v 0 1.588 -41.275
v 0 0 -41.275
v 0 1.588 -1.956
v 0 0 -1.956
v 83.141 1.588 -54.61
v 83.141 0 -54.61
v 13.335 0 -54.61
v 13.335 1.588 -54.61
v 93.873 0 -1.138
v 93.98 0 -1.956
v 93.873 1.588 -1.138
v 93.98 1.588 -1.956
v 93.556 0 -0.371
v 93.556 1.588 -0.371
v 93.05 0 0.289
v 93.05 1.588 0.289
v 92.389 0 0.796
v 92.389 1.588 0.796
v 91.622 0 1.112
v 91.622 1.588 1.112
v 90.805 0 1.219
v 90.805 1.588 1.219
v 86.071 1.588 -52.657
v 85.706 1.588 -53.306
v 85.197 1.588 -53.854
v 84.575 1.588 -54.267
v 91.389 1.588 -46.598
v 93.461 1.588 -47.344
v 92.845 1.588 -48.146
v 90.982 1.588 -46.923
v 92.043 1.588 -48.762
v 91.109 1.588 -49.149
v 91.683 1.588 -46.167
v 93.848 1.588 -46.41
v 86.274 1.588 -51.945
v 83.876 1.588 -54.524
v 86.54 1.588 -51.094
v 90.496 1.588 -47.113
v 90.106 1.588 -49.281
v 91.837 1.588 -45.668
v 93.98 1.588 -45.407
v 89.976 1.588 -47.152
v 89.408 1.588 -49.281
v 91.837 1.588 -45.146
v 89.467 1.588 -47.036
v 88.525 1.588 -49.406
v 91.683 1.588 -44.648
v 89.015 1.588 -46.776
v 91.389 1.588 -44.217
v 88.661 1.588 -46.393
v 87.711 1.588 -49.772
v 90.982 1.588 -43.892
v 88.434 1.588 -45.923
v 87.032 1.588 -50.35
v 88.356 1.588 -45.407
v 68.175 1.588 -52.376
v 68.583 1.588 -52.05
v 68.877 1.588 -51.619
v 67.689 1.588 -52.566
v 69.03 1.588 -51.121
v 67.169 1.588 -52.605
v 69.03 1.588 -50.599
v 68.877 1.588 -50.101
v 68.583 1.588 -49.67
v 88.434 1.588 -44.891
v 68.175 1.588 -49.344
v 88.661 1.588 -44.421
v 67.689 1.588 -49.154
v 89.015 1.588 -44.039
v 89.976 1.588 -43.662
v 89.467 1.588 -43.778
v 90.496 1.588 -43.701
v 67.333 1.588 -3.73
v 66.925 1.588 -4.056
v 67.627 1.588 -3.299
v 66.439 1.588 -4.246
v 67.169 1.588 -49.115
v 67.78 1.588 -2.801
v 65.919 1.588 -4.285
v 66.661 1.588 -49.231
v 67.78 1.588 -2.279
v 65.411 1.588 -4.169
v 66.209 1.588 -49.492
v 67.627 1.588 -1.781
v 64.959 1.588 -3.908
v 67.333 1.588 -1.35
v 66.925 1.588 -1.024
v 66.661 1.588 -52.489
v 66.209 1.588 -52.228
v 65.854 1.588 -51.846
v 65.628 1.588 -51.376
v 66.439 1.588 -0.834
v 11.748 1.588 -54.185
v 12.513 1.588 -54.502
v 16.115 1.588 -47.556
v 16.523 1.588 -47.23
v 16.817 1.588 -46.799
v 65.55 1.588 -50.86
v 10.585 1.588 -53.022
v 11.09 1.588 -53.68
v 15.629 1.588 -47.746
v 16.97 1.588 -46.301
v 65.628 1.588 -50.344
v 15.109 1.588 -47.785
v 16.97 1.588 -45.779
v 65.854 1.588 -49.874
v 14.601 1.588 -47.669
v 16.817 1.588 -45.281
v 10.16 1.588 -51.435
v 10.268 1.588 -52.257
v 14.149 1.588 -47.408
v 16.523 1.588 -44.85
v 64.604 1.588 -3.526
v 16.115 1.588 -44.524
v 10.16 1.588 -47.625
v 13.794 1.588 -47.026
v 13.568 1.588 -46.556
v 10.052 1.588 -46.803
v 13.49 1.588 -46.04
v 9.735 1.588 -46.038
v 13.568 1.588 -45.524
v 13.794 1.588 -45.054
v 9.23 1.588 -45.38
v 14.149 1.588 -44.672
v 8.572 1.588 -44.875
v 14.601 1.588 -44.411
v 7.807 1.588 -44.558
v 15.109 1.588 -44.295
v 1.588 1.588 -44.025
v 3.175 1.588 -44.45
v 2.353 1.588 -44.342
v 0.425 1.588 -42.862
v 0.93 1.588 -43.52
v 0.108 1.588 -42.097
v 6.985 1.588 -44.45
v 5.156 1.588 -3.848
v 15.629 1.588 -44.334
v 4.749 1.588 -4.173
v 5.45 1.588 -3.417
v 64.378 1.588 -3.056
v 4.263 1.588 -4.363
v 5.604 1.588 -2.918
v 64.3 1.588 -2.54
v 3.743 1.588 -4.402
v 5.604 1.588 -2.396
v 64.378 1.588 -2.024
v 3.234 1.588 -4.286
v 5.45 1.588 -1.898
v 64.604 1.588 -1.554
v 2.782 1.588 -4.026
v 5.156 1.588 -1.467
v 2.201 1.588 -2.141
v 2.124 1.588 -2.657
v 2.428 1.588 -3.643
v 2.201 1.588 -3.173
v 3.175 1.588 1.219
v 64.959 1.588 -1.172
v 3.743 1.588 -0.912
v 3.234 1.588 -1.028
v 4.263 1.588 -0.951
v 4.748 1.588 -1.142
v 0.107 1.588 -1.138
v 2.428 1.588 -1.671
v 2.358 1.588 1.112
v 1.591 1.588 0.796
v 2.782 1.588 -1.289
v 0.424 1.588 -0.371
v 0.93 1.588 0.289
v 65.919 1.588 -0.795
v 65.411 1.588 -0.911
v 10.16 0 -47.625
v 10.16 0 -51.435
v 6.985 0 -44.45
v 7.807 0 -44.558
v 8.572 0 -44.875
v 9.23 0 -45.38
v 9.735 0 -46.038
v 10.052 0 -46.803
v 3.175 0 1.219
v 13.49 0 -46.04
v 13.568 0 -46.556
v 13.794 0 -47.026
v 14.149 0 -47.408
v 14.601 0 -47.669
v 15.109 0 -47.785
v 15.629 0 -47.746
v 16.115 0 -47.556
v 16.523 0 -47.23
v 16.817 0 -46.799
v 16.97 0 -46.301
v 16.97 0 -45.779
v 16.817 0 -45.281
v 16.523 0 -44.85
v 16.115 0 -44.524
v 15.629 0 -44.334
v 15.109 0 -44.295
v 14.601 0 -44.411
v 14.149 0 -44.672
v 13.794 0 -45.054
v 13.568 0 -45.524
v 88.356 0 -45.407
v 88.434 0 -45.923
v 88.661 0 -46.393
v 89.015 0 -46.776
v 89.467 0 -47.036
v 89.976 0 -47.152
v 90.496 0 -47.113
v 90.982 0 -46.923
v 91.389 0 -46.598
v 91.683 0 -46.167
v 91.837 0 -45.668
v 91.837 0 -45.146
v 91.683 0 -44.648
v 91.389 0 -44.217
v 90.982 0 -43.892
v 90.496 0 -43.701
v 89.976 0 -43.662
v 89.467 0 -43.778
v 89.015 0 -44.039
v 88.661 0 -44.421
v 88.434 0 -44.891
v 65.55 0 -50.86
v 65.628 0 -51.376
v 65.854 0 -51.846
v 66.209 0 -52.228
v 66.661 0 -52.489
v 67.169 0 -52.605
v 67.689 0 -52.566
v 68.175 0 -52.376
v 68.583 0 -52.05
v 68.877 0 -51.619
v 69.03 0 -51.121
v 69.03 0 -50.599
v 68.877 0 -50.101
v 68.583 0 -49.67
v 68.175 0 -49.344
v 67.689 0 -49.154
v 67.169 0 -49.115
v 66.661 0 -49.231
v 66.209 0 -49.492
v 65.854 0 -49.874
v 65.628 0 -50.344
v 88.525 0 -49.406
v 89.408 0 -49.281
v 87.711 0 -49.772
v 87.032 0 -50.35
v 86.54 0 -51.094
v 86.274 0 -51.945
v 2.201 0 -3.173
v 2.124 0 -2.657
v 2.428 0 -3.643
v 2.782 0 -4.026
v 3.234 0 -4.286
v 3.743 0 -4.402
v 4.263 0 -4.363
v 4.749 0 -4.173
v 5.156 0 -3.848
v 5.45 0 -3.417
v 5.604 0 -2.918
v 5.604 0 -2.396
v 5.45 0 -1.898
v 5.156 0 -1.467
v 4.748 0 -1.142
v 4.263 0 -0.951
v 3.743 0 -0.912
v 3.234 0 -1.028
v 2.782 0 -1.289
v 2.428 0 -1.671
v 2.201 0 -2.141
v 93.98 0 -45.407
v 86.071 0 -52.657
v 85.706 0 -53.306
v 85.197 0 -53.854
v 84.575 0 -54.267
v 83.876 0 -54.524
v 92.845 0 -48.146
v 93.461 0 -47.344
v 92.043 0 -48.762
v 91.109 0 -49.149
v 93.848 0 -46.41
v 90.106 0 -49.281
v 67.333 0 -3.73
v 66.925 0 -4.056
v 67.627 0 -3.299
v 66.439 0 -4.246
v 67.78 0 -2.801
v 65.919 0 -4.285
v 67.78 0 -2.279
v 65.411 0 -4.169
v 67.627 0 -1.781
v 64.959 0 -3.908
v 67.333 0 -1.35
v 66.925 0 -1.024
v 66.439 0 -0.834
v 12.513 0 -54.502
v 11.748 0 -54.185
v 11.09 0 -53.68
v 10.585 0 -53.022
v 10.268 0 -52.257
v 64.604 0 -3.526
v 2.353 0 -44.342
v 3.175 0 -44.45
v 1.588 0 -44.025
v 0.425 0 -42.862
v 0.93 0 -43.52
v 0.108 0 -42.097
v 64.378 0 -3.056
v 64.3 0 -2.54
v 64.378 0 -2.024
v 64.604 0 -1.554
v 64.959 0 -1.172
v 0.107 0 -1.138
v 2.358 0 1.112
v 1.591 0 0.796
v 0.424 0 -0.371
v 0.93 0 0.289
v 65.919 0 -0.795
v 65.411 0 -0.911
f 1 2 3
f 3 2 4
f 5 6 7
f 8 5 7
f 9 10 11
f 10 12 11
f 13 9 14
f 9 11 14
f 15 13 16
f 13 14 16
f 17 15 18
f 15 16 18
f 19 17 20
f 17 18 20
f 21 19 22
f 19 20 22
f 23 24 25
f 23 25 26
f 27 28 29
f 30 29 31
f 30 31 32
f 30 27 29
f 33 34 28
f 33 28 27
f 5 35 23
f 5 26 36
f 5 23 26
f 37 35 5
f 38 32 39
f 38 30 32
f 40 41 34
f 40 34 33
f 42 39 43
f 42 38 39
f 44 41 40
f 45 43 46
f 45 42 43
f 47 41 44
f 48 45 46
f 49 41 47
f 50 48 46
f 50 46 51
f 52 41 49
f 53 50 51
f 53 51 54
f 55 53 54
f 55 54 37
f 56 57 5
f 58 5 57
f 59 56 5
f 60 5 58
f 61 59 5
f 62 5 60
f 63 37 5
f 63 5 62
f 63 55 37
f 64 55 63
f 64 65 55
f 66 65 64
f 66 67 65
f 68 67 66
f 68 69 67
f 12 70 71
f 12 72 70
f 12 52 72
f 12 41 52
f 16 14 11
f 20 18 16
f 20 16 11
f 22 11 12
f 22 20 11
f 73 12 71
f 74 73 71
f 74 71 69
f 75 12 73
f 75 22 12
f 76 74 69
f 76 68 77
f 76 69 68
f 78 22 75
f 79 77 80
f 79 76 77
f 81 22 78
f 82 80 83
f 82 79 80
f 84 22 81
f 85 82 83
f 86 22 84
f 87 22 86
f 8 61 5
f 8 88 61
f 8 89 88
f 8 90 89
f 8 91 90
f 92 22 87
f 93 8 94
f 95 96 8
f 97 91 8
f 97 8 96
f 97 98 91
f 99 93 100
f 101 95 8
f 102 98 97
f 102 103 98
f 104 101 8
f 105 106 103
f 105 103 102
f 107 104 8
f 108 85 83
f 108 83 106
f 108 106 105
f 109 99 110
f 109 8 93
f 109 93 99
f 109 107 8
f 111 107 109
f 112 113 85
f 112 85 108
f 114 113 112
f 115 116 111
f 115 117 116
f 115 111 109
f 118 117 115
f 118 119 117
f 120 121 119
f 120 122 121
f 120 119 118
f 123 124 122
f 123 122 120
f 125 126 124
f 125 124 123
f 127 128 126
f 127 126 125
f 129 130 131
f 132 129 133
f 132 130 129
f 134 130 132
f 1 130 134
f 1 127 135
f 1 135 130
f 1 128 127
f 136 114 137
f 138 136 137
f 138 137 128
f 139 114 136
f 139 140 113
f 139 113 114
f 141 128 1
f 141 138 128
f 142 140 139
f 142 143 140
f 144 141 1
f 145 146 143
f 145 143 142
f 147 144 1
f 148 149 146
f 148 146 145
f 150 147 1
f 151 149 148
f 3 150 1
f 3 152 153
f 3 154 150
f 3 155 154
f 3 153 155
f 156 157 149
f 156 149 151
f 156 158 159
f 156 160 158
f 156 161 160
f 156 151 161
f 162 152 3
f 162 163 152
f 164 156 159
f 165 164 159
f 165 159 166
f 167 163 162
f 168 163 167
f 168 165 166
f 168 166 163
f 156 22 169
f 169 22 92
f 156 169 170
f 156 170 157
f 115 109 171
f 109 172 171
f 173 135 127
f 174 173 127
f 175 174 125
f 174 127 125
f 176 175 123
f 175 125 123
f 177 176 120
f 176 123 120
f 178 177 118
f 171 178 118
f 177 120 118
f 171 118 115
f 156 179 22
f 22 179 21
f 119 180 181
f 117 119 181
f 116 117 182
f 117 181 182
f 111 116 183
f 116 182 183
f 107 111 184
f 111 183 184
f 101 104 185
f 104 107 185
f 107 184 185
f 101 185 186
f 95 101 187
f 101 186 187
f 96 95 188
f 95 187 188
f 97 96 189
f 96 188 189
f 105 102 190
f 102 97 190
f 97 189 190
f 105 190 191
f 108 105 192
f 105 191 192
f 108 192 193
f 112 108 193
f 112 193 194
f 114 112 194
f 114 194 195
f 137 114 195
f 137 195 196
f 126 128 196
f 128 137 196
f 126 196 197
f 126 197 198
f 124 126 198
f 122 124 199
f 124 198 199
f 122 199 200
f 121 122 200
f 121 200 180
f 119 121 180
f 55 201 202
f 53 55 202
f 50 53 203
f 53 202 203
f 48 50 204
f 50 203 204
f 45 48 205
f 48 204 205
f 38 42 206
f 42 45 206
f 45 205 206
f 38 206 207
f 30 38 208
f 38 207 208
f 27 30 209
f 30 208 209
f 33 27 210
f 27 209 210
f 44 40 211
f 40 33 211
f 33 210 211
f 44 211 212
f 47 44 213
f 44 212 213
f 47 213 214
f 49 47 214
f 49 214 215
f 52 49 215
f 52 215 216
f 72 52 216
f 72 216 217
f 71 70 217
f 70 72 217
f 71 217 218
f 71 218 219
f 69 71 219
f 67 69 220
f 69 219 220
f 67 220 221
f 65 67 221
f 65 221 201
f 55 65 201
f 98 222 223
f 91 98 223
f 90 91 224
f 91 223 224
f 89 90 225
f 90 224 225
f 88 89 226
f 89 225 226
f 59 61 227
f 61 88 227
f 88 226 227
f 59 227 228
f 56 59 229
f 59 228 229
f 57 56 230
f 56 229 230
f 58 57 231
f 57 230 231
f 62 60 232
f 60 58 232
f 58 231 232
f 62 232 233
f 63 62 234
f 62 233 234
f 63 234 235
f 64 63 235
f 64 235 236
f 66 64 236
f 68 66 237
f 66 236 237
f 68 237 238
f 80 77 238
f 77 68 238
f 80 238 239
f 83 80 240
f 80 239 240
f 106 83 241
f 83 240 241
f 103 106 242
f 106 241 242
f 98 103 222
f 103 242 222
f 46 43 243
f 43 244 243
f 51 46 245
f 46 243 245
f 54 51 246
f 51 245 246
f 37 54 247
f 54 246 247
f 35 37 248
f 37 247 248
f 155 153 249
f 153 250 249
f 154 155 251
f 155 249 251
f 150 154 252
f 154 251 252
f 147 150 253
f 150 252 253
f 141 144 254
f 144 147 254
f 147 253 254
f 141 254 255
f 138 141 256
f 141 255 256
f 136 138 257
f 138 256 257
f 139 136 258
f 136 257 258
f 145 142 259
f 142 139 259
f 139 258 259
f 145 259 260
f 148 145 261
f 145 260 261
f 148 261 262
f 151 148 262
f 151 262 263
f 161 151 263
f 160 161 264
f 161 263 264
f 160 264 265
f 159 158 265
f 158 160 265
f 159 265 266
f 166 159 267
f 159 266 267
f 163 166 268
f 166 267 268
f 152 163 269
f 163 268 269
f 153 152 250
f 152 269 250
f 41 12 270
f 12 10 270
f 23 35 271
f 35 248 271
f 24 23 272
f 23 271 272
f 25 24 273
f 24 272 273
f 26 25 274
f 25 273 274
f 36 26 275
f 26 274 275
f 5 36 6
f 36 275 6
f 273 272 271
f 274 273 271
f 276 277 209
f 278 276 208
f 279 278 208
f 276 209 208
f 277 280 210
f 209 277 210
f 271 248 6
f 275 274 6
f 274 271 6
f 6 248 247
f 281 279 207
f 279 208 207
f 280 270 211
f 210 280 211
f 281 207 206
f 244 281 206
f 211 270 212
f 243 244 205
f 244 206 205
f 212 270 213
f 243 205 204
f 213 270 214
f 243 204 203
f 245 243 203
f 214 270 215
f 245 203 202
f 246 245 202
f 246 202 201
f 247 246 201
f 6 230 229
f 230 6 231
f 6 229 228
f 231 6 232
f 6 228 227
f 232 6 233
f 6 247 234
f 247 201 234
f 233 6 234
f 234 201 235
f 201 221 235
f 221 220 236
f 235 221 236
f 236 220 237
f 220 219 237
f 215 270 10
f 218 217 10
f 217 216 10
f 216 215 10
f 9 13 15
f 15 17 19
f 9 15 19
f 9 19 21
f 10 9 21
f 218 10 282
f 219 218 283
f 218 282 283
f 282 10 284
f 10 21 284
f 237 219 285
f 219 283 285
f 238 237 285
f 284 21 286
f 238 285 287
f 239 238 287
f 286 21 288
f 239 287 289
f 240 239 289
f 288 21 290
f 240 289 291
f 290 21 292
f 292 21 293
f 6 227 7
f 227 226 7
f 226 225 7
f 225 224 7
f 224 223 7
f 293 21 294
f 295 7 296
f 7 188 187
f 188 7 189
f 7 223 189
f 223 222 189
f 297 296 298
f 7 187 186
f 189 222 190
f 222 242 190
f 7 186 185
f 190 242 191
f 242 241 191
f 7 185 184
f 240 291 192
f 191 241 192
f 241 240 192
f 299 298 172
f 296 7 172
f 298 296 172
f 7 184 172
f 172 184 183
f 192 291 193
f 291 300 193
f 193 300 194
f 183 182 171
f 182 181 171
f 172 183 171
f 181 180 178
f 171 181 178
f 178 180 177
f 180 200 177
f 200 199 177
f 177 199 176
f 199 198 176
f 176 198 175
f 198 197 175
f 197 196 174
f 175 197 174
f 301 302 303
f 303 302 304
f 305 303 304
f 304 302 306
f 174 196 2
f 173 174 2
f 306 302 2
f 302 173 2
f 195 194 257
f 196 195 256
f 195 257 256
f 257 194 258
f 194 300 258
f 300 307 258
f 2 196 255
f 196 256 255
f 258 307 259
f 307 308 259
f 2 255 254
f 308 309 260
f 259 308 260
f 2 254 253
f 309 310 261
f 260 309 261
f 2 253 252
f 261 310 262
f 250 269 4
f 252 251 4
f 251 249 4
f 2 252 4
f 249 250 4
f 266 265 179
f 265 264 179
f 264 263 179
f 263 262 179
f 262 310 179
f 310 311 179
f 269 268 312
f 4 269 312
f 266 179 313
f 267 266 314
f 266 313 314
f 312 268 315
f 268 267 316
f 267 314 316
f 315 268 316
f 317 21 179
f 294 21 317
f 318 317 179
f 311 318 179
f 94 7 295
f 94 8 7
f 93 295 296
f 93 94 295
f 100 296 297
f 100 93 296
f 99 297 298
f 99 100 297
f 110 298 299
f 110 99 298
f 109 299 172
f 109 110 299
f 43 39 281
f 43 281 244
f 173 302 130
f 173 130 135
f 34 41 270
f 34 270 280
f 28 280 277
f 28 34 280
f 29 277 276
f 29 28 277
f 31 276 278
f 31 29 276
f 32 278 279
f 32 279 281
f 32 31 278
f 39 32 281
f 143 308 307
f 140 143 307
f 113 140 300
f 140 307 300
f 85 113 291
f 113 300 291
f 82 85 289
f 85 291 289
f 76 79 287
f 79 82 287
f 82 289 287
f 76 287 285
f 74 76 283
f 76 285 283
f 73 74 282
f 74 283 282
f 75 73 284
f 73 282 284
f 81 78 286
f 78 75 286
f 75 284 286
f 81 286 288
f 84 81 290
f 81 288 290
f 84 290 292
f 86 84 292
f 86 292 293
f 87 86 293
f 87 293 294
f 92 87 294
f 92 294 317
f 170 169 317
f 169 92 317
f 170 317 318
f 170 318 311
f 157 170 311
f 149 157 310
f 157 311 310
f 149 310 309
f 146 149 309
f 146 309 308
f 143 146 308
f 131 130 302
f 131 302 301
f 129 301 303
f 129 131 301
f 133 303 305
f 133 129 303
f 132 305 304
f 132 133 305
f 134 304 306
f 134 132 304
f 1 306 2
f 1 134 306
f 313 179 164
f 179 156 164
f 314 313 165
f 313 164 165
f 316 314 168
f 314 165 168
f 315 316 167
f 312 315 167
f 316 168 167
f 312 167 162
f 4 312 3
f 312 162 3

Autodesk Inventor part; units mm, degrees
ref_plane "YZ Plane" through (0, 0, 0) normal (1, 0, 0) x (0, 1, 0)
ref_plane "XZ Plane" through (0, 0, 0) normal (0, 1, 0) x (-1, 0, 0)
ref_plane "XY Plane" through (0, 0, 0) normal (0, 0, 1) x (1, 0, 0)
sketch "Sketch1" plane through (0, 0, 0) normal (0, 1, 0) x (-1, 0, 0)
  line L0 (-93.98, 0) -> (-93.98, -44.45)
  line L1 (0, -44.45) -> (0, 0)
  circle A0 centre (-15.24, -46.04) radius 1.75
  circle A1 centre (-67.3, -50.86) radius 1.75
  circle A2 centre (-66.05, -2.54) radius 1.75
  line L2 (0, -44.45) -> (-10.16, -44.45)
  line L3 (-93.98, -44.45) -> (-93.98, -54.61)
  line L4 (-93.98, -54.61) -> (-10.16, -54.61)
  line L5 (-10.16, -54.61) -> (-10.16, -44.45)
  line L6 (-66.05, 1.2192) -> (-93.98, 1.2192)
  line L7 (-93.98, 1.2192) -> (-93.98, 0)
  line L8 (-66.05, 1.2192) -> (0, 1.2192)
  line L9 (0, 1.2192) -> (0, 0)
  line L10 (0, 1.2192) -> (0, -6.5338)
  circle A3 centre (-3.8735, -2.6573) radius 1.75
  line L11 (-93.98, -49.2808) -> (-93.98, -41.5338)
  circle A4 centre (-90.1065, -45.4073) radius 1.75
extrude "Extrusion1" add sketch "Sketch1" along normal blind 1.5875
fillet "Fillet1" radius 3.175 6 edges at (0, 0.7937, 1.2192) (0, 0.7937, -44.45) (10.16, 0.7937, -44.45) (10.16, 0.7937, -54.61) (93.98, 0.7937, 1.2192) (93.98, 0.7937, -54.61)
sketch "Sketch2" plane through (0, 1.5875, 0) normal (0, 1, 0) x (1, 0, 0)
  circle A0 centre (90.1065, 45.4073) radius 1.75 projected
  arc A1 (93.98, 45.4073) -> (90.1065, 49.2808) centre (90.1065, 45.4073) ccw
  line L0 (93.98, 1.9558) -> (93.98, 51.435) projected
  line L1 (86.233, 49.2808) -> (86.233, 54.61)
  line L2 (90.805, 54.61) -> (13.335, 54.61) projected
  line L3 (90.1065, 49.2808) -> (86.233, 49.2808)
  arc A2 (93.98, 51.435) -> (90.805, 54.61) centre (90.805, 51.435) ccw projected
  arc A3 (93.98, 51.435) -> (90.805, 54.61) centre (90.805, 51.435) ccw
  line L4 (93.98, 45.4073) -> (93.98, 51.435)
  line L5 (90.805, 54.61) -> (86.233, 54.61)
  point P0 (0, 0)
extrude "Extrusion2" cut sketch "Sketch2" against normal blind 25.4 contours A1 L3 L1 L2 A2 L0
fillet "Fillet2" radius 3.175 2 edges at (86.233, 0.7937, -49.2808) (86.233, 0.7937, -54.61)
properties part number "escPlate"
